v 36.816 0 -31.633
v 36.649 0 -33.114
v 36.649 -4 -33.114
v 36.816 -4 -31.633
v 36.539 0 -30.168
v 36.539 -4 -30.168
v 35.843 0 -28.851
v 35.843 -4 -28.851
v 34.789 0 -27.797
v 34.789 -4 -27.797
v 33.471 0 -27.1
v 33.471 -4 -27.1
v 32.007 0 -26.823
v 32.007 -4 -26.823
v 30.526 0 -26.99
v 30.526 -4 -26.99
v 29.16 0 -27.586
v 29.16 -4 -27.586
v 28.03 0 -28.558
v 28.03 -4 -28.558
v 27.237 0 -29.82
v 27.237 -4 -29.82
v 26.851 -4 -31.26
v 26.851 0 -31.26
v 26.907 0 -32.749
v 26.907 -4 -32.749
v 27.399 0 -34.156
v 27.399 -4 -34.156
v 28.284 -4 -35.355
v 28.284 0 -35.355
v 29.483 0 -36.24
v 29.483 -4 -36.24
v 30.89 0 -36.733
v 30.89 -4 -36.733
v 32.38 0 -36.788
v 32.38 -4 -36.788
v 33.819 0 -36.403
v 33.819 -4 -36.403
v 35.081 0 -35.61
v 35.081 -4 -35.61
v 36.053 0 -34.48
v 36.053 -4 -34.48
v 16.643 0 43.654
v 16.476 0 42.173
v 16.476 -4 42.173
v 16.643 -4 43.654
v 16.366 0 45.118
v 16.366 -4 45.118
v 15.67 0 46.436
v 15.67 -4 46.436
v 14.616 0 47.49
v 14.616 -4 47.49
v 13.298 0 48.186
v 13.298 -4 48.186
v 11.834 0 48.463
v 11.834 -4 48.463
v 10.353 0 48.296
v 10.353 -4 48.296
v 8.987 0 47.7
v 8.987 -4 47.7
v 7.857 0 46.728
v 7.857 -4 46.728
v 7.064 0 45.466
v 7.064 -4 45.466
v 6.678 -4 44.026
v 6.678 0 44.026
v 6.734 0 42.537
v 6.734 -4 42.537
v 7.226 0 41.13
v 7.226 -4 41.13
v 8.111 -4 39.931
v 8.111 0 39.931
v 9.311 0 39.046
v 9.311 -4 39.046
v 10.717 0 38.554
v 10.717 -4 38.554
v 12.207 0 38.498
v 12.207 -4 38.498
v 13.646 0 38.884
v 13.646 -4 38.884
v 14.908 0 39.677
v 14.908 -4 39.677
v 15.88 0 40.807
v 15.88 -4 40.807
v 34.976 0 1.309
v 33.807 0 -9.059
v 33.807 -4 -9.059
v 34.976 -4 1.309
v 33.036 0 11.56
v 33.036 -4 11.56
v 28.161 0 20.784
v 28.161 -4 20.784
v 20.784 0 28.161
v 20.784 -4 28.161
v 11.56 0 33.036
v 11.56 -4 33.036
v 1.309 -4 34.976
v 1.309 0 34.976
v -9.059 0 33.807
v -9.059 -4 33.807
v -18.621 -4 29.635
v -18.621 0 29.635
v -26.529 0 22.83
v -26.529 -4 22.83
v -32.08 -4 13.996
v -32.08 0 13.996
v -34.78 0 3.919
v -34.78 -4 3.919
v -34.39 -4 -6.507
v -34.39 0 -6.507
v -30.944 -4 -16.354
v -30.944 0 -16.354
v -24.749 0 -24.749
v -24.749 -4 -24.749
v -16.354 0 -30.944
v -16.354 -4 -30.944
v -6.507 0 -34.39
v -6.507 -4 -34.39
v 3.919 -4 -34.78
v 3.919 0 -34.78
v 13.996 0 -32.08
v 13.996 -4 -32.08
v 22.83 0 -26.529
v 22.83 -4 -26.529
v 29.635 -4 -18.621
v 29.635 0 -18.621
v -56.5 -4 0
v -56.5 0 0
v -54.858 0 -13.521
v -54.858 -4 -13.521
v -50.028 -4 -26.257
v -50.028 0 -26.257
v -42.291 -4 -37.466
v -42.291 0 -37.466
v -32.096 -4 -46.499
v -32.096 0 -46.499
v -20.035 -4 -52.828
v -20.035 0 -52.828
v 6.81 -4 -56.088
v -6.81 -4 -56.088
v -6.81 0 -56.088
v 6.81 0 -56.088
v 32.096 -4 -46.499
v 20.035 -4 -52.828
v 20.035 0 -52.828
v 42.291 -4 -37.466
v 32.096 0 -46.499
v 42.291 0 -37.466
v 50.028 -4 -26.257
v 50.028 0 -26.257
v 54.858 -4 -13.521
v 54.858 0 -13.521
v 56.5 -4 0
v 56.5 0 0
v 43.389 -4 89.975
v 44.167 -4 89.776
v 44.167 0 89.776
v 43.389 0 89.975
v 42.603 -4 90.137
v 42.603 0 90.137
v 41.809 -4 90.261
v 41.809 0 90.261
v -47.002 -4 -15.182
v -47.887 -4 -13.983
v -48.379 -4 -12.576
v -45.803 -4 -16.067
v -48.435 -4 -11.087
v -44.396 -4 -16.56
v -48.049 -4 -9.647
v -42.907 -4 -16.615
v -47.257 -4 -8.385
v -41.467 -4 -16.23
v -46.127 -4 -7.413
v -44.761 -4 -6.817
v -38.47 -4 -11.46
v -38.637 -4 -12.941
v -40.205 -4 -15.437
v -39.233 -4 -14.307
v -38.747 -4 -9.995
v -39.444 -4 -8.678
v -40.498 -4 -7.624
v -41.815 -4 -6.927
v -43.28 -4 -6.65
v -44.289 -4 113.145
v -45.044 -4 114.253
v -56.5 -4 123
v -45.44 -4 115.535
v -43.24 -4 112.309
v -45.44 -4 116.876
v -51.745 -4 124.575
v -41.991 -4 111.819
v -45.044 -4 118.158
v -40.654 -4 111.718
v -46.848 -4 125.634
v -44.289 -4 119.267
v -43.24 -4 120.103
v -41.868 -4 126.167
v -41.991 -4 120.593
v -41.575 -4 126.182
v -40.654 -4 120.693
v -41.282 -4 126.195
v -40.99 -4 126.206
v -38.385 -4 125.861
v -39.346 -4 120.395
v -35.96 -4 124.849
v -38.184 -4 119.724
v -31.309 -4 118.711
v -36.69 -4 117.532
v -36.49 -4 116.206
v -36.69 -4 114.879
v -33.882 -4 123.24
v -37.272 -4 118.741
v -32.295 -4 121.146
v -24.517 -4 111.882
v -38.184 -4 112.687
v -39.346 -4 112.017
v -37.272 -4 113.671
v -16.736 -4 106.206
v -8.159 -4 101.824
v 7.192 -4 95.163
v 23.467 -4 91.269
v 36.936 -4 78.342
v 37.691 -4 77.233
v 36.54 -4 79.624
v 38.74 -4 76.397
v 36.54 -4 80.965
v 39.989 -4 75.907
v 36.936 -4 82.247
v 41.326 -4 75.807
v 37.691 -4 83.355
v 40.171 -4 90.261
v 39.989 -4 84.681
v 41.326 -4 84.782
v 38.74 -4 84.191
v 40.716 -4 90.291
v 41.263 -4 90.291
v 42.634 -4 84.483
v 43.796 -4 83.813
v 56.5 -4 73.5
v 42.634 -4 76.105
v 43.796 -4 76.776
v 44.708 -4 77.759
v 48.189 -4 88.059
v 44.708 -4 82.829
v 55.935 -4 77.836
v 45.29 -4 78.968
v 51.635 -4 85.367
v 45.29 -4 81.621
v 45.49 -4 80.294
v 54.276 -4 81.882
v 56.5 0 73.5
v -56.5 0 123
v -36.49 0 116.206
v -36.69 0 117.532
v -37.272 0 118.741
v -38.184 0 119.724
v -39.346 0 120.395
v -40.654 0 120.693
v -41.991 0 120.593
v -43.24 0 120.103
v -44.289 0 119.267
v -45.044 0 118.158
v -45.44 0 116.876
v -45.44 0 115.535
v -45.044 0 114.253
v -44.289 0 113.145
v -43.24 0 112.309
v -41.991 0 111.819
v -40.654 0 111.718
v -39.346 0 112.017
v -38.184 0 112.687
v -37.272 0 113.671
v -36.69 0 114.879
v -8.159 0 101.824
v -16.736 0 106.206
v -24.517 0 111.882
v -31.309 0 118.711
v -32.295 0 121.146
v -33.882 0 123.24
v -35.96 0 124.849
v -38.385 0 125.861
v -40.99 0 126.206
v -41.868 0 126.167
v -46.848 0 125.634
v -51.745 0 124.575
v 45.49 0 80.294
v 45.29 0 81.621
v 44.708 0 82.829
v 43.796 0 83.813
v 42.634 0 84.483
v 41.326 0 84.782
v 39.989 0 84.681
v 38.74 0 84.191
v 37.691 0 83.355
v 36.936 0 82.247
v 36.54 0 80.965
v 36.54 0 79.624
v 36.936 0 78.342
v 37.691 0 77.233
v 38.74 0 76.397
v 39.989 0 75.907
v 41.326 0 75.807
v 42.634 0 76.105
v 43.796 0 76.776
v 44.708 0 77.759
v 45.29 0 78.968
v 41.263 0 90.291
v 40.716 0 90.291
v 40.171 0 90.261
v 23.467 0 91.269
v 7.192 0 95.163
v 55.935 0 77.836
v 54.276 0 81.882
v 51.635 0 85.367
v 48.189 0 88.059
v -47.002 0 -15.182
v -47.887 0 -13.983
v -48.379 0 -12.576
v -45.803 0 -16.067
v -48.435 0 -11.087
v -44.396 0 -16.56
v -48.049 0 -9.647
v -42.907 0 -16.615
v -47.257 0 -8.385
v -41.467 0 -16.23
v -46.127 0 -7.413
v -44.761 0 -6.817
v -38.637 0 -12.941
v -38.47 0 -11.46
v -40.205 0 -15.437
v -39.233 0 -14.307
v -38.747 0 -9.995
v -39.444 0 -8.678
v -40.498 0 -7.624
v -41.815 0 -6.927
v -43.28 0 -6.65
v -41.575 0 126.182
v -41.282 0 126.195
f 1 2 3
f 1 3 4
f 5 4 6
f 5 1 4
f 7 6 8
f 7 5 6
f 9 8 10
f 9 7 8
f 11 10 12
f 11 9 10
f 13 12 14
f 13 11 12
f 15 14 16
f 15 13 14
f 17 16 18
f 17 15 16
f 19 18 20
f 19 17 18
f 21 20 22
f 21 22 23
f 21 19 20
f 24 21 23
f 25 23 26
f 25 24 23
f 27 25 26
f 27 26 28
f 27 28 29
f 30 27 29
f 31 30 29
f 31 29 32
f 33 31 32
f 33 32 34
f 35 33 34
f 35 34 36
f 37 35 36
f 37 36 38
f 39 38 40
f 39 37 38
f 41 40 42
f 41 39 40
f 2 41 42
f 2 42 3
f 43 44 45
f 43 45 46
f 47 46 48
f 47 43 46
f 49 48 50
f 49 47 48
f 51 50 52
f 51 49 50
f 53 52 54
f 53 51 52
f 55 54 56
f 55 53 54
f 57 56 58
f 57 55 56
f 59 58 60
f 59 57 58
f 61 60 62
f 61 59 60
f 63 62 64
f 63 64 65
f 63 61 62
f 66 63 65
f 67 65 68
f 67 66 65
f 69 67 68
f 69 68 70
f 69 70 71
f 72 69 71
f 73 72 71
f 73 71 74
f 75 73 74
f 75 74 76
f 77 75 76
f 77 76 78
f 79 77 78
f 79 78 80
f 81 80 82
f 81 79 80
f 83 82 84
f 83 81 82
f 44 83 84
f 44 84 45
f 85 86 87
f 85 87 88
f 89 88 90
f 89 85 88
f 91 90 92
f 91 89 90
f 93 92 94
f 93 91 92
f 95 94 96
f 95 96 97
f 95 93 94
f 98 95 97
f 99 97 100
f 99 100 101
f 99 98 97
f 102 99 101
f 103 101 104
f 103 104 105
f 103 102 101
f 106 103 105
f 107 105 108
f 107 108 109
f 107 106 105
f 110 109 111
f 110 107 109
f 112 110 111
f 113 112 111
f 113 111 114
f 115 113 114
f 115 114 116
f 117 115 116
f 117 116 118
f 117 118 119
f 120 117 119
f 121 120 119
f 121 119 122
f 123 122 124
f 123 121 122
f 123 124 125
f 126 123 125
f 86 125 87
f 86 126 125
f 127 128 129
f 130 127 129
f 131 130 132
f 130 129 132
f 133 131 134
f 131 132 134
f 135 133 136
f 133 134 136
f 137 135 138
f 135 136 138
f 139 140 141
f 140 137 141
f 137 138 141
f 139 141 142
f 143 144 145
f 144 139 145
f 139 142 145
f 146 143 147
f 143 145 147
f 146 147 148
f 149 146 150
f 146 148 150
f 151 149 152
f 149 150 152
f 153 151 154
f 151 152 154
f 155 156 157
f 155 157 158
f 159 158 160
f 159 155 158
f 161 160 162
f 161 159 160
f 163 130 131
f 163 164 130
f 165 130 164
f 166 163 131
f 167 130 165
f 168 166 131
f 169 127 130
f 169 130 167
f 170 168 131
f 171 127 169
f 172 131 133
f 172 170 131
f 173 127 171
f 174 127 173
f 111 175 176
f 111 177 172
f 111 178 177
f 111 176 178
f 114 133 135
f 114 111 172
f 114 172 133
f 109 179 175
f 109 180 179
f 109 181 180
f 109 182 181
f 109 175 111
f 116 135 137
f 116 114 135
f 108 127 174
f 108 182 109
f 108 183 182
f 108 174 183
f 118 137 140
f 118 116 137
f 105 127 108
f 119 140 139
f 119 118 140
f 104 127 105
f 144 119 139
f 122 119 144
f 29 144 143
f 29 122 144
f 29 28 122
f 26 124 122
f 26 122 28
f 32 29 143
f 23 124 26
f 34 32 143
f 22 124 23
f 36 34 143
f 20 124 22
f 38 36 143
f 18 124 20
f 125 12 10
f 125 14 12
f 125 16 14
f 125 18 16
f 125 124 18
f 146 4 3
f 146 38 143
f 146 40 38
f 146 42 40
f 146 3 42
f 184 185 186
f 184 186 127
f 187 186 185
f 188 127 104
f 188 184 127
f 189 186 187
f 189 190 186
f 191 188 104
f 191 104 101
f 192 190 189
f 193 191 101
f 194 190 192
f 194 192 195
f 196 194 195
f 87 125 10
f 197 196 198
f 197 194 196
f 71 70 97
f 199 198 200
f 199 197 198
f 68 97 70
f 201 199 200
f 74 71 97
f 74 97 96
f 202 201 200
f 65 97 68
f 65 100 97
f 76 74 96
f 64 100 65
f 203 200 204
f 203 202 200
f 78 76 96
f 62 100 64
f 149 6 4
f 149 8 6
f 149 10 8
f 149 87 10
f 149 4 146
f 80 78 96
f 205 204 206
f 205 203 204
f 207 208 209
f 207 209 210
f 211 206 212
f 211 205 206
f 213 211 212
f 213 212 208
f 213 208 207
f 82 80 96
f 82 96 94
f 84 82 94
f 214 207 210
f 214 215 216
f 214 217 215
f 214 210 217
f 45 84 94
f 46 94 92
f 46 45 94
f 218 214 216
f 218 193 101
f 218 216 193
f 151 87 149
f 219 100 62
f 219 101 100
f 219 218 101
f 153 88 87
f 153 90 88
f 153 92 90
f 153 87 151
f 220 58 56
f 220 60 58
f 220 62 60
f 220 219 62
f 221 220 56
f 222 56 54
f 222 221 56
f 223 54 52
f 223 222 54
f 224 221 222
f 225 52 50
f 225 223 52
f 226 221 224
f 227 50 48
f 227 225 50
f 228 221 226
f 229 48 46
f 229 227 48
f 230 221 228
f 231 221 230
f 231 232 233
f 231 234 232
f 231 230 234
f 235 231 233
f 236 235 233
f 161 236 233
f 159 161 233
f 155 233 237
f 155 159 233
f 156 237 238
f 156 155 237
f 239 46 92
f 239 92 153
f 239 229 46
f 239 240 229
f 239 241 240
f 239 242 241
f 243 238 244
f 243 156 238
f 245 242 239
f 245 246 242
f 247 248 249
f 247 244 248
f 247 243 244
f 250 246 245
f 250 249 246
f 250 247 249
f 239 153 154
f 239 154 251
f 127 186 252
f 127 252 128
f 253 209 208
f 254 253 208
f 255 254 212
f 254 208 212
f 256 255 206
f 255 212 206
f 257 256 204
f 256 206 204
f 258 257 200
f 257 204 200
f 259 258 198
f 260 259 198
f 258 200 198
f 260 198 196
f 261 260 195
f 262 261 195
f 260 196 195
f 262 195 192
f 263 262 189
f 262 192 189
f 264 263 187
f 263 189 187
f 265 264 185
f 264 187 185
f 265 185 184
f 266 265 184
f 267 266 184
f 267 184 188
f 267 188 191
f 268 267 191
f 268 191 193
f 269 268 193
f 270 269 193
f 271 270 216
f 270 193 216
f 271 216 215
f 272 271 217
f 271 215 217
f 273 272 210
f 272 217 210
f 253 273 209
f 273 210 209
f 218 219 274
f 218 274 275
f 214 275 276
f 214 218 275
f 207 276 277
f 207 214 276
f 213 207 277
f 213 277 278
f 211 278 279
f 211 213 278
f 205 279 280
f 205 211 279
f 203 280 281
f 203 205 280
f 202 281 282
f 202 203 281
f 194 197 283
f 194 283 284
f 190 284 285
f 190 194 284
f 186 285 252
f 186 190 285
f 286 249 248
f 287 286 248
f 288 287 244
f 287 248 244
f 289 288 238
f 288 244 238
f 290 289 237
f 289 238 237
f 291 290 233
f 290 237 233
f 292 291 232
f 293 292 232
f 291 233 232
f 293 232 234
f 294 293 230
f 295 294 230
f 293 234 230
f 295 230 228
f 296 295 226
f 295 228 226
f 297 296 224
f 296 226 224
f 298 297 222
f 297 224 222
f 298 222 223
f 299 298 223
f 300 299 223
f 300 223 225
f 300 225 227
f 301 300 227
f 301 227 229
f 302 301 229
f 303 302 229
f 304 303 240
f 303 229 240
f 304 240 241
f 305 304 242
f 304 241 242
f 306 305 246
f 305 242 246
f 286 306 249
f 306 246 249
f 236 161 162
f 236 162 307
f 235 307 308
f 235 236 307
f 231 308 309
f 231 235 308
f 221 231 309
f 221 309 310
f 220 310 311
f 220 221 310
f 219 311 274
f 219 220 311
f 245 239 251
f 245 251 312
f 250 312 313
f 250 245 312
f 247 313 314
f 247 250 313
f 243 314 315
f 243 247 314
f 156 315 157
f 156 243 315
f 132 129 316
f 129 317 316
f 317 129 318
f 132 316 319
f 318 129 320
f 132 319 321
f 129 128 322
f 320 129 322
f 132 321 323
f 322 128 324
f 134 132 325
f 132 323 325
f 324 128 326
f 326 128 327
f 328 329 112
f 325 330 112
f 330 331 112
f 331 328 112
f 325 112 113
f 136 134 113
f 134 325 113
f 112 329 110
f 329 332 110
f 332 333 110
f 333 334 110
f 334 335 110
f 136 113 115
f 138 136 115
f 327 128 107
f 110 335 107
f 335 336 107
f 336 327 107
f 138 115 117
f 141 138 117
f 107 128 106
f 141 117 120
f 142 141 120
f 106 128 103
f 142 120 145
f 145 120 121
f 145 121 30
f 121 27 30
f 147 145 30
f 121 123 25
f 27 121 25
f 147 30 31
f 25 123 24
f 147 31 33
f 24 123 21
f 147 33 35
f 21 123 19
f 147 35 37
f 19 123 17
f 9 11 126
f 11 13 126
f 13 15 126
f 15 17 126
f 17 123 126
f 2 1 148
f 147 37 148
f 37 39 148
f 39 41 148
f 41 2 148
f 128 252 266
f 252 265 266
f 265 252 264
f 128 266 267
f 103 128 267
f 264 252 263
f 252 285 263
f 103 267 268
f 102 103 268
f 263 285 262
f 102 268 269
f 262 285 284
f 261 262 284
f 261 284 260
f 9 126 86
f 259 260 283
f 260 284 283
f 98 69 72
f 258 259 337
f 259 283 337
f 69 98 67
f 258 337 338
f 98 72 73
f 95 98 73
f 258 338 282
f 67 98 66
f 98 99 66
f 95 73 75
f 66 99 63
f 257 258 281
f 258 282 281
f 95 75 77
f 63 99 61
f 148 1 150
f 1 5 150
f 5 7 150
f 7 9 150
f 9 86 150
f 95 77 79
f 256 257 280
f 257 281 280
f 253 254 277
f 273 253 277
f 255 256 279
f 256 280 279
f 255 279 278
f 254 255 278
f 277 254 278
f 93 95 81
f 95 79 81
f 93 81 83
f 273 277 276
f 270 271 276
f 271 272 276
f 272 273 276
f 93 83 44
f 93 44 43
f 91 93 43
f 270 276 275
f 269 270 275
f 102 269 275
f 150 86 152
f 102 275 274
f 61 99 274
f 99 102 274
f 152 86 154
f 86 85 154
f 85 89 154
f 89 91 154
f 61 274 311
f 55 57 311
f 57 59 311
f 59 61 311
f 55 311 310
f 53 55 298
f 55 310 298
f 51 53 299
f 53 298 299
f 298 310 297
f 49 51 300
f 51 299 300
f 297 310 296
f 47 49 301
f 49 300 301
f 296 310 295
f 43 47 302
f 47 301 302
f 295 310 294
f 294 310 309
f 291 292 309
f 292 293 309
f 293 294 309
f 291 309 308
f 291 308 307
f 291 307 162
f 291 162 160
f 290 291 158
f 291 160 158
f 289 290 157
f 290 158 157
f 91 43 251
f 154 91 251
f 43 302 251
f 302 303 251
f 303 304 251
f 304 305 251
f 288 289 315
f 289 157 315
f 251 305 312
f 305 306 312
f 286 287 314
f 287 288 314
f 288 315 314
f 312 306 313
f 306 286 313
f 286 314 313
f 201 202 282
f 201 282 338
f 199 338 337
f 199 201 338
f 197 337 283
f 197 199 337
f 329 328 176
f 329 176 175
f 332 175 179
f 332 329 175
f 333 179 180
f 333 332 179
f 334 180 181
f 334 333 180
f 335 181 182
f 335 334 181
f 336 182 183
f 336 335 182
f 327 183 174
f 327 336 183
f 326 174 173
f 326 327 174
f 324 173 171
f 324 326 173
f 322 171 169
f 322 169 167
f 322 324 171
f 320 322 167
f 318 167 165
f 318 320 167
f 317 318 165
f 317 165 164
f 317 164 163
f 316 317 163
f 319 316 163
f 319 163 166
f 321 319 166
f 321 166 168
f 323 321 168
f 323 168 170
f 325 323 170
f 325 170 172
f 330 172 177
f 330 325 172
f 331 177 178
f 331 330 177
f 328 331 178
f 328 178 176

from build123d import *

# Parameters (mm, degrees)
F0_R     = 56.5
F0_R_2   = 5
F0_R_3   = 35
F1_DEPTH = 4
F2_ANGLE = -15
F3_R     = 4.5
F4_DEPTH = 4


with BuildPart() as f1:
    # F0 (on Front) → F1 (new body)
    with BuildSketch(Plane.XZ):
        Circle(F0_R)
        with Locations((-38.971143, -22.5)):
            Circle(F0_R_2, mode=Mode.SUBTRACT)
        with Locations((38.971143, -22.5)):
            Circle(F0_R_2, mode=Mode.SUBTRACT)
        Circle(F0_R_3, mode=Mode.SUBTRACT)
        with Locations((0, 45)):
            Circle(F0_R_2, mode=Mode.SUBTRACT)
    extrude(amount=F1_DEPTH)


with BuildPart() as f1_1:
    # F2: moved
    add(f1.part.rotate(Axis((0, -4, 0), (0, -1, 0)), F2_ANGLE))

    # F3 (on face) → F4 (join)
    with BuildSketch(Plane.XZ.offset(4)):
        with BuildLine():
            Line((-56.5, 123), (-56.5, 0))
            ThreePointArc((-56.5, 0), (0, 56.5), (56.5, 0))
            Line((56.5, 0), (56.5, 73.5))
            ThreePointArc((56.5, 73.5), (53.068627, 83.710308), (44.167387, 89.776001))
            ThreePointArc((44.167387, 89.776001), (49.10698, 86.134844), (50.98986, 80.294265))
            ThreePointArc((50.98986, 80.294265), (34.214658, 72.939223), (40.17053, 90.260643))
            ThreePointArc((40.17053, 90.260643), (15.244627, 92.860772), (-8.158831, 101.824001))
            ThreePointArc((-8.158831, 101.824001), (-20.738354, 108.890352), (-31.308753, 118.710962))
            ThreePointArc((-31.308753, 118.710962), (-31.069903, 117.468456), (-30.98986, 116.205735))
            ThreePointArc((-30.98986, 116.205735), (-47.743504, 108.830893), (-41.867518, 126.167146))
            ThreePointArc((-41.867518, 126.167146), (-49.310618, 125.169671), (-56.5, 123))
        make_face()
        with BuildLine():
            ThreePointArc((-40.98986, 126.205735), (-41.428779, 126.18849), (-41.867518, 126.167146))
            ThreePointArc((-41.867518, 126.167146), (-47.743504, 108.830893), (-30.98986, 116.205735))
            ThreePointArc((-30.98986, 116.205735), (-31.069903, 117.468456), (-31.308753, 118.710962))
            ThreePointArc((-31.308753, 118.710962), (-34.86827, 124.113082), (-40.98986, 126.205735))
        make_face()
        with Locations((-40.98986, 116.205735)):
            Circle(F3_R, mode=Mode.SUBTRACT)
        with BuildLine():
            ThreePointArc((50.98986, 80.294265), (49.10698, 86.134844), (44.167387, 89.776001))
            ThreePointArc((44.167387, 89.776001), (42.996926, 90.060352), (41.809189, 90.260643))
            ThreePointArc((41.809189, 90.260643), (40.98986, 90.294265), (40.17053, 90.260643))
            ThreePointArc((40.17053, 90.260643), (34.214658, 72.939223), (50.98986, 80.294265))
        make_face()
        with Locations((40.98986, 80.294265)):
            Circle(F3_R, mode=Mode.SUBTRACT)
    extrude(amount=-F4_DEPTH)


solid = f1_1.part
